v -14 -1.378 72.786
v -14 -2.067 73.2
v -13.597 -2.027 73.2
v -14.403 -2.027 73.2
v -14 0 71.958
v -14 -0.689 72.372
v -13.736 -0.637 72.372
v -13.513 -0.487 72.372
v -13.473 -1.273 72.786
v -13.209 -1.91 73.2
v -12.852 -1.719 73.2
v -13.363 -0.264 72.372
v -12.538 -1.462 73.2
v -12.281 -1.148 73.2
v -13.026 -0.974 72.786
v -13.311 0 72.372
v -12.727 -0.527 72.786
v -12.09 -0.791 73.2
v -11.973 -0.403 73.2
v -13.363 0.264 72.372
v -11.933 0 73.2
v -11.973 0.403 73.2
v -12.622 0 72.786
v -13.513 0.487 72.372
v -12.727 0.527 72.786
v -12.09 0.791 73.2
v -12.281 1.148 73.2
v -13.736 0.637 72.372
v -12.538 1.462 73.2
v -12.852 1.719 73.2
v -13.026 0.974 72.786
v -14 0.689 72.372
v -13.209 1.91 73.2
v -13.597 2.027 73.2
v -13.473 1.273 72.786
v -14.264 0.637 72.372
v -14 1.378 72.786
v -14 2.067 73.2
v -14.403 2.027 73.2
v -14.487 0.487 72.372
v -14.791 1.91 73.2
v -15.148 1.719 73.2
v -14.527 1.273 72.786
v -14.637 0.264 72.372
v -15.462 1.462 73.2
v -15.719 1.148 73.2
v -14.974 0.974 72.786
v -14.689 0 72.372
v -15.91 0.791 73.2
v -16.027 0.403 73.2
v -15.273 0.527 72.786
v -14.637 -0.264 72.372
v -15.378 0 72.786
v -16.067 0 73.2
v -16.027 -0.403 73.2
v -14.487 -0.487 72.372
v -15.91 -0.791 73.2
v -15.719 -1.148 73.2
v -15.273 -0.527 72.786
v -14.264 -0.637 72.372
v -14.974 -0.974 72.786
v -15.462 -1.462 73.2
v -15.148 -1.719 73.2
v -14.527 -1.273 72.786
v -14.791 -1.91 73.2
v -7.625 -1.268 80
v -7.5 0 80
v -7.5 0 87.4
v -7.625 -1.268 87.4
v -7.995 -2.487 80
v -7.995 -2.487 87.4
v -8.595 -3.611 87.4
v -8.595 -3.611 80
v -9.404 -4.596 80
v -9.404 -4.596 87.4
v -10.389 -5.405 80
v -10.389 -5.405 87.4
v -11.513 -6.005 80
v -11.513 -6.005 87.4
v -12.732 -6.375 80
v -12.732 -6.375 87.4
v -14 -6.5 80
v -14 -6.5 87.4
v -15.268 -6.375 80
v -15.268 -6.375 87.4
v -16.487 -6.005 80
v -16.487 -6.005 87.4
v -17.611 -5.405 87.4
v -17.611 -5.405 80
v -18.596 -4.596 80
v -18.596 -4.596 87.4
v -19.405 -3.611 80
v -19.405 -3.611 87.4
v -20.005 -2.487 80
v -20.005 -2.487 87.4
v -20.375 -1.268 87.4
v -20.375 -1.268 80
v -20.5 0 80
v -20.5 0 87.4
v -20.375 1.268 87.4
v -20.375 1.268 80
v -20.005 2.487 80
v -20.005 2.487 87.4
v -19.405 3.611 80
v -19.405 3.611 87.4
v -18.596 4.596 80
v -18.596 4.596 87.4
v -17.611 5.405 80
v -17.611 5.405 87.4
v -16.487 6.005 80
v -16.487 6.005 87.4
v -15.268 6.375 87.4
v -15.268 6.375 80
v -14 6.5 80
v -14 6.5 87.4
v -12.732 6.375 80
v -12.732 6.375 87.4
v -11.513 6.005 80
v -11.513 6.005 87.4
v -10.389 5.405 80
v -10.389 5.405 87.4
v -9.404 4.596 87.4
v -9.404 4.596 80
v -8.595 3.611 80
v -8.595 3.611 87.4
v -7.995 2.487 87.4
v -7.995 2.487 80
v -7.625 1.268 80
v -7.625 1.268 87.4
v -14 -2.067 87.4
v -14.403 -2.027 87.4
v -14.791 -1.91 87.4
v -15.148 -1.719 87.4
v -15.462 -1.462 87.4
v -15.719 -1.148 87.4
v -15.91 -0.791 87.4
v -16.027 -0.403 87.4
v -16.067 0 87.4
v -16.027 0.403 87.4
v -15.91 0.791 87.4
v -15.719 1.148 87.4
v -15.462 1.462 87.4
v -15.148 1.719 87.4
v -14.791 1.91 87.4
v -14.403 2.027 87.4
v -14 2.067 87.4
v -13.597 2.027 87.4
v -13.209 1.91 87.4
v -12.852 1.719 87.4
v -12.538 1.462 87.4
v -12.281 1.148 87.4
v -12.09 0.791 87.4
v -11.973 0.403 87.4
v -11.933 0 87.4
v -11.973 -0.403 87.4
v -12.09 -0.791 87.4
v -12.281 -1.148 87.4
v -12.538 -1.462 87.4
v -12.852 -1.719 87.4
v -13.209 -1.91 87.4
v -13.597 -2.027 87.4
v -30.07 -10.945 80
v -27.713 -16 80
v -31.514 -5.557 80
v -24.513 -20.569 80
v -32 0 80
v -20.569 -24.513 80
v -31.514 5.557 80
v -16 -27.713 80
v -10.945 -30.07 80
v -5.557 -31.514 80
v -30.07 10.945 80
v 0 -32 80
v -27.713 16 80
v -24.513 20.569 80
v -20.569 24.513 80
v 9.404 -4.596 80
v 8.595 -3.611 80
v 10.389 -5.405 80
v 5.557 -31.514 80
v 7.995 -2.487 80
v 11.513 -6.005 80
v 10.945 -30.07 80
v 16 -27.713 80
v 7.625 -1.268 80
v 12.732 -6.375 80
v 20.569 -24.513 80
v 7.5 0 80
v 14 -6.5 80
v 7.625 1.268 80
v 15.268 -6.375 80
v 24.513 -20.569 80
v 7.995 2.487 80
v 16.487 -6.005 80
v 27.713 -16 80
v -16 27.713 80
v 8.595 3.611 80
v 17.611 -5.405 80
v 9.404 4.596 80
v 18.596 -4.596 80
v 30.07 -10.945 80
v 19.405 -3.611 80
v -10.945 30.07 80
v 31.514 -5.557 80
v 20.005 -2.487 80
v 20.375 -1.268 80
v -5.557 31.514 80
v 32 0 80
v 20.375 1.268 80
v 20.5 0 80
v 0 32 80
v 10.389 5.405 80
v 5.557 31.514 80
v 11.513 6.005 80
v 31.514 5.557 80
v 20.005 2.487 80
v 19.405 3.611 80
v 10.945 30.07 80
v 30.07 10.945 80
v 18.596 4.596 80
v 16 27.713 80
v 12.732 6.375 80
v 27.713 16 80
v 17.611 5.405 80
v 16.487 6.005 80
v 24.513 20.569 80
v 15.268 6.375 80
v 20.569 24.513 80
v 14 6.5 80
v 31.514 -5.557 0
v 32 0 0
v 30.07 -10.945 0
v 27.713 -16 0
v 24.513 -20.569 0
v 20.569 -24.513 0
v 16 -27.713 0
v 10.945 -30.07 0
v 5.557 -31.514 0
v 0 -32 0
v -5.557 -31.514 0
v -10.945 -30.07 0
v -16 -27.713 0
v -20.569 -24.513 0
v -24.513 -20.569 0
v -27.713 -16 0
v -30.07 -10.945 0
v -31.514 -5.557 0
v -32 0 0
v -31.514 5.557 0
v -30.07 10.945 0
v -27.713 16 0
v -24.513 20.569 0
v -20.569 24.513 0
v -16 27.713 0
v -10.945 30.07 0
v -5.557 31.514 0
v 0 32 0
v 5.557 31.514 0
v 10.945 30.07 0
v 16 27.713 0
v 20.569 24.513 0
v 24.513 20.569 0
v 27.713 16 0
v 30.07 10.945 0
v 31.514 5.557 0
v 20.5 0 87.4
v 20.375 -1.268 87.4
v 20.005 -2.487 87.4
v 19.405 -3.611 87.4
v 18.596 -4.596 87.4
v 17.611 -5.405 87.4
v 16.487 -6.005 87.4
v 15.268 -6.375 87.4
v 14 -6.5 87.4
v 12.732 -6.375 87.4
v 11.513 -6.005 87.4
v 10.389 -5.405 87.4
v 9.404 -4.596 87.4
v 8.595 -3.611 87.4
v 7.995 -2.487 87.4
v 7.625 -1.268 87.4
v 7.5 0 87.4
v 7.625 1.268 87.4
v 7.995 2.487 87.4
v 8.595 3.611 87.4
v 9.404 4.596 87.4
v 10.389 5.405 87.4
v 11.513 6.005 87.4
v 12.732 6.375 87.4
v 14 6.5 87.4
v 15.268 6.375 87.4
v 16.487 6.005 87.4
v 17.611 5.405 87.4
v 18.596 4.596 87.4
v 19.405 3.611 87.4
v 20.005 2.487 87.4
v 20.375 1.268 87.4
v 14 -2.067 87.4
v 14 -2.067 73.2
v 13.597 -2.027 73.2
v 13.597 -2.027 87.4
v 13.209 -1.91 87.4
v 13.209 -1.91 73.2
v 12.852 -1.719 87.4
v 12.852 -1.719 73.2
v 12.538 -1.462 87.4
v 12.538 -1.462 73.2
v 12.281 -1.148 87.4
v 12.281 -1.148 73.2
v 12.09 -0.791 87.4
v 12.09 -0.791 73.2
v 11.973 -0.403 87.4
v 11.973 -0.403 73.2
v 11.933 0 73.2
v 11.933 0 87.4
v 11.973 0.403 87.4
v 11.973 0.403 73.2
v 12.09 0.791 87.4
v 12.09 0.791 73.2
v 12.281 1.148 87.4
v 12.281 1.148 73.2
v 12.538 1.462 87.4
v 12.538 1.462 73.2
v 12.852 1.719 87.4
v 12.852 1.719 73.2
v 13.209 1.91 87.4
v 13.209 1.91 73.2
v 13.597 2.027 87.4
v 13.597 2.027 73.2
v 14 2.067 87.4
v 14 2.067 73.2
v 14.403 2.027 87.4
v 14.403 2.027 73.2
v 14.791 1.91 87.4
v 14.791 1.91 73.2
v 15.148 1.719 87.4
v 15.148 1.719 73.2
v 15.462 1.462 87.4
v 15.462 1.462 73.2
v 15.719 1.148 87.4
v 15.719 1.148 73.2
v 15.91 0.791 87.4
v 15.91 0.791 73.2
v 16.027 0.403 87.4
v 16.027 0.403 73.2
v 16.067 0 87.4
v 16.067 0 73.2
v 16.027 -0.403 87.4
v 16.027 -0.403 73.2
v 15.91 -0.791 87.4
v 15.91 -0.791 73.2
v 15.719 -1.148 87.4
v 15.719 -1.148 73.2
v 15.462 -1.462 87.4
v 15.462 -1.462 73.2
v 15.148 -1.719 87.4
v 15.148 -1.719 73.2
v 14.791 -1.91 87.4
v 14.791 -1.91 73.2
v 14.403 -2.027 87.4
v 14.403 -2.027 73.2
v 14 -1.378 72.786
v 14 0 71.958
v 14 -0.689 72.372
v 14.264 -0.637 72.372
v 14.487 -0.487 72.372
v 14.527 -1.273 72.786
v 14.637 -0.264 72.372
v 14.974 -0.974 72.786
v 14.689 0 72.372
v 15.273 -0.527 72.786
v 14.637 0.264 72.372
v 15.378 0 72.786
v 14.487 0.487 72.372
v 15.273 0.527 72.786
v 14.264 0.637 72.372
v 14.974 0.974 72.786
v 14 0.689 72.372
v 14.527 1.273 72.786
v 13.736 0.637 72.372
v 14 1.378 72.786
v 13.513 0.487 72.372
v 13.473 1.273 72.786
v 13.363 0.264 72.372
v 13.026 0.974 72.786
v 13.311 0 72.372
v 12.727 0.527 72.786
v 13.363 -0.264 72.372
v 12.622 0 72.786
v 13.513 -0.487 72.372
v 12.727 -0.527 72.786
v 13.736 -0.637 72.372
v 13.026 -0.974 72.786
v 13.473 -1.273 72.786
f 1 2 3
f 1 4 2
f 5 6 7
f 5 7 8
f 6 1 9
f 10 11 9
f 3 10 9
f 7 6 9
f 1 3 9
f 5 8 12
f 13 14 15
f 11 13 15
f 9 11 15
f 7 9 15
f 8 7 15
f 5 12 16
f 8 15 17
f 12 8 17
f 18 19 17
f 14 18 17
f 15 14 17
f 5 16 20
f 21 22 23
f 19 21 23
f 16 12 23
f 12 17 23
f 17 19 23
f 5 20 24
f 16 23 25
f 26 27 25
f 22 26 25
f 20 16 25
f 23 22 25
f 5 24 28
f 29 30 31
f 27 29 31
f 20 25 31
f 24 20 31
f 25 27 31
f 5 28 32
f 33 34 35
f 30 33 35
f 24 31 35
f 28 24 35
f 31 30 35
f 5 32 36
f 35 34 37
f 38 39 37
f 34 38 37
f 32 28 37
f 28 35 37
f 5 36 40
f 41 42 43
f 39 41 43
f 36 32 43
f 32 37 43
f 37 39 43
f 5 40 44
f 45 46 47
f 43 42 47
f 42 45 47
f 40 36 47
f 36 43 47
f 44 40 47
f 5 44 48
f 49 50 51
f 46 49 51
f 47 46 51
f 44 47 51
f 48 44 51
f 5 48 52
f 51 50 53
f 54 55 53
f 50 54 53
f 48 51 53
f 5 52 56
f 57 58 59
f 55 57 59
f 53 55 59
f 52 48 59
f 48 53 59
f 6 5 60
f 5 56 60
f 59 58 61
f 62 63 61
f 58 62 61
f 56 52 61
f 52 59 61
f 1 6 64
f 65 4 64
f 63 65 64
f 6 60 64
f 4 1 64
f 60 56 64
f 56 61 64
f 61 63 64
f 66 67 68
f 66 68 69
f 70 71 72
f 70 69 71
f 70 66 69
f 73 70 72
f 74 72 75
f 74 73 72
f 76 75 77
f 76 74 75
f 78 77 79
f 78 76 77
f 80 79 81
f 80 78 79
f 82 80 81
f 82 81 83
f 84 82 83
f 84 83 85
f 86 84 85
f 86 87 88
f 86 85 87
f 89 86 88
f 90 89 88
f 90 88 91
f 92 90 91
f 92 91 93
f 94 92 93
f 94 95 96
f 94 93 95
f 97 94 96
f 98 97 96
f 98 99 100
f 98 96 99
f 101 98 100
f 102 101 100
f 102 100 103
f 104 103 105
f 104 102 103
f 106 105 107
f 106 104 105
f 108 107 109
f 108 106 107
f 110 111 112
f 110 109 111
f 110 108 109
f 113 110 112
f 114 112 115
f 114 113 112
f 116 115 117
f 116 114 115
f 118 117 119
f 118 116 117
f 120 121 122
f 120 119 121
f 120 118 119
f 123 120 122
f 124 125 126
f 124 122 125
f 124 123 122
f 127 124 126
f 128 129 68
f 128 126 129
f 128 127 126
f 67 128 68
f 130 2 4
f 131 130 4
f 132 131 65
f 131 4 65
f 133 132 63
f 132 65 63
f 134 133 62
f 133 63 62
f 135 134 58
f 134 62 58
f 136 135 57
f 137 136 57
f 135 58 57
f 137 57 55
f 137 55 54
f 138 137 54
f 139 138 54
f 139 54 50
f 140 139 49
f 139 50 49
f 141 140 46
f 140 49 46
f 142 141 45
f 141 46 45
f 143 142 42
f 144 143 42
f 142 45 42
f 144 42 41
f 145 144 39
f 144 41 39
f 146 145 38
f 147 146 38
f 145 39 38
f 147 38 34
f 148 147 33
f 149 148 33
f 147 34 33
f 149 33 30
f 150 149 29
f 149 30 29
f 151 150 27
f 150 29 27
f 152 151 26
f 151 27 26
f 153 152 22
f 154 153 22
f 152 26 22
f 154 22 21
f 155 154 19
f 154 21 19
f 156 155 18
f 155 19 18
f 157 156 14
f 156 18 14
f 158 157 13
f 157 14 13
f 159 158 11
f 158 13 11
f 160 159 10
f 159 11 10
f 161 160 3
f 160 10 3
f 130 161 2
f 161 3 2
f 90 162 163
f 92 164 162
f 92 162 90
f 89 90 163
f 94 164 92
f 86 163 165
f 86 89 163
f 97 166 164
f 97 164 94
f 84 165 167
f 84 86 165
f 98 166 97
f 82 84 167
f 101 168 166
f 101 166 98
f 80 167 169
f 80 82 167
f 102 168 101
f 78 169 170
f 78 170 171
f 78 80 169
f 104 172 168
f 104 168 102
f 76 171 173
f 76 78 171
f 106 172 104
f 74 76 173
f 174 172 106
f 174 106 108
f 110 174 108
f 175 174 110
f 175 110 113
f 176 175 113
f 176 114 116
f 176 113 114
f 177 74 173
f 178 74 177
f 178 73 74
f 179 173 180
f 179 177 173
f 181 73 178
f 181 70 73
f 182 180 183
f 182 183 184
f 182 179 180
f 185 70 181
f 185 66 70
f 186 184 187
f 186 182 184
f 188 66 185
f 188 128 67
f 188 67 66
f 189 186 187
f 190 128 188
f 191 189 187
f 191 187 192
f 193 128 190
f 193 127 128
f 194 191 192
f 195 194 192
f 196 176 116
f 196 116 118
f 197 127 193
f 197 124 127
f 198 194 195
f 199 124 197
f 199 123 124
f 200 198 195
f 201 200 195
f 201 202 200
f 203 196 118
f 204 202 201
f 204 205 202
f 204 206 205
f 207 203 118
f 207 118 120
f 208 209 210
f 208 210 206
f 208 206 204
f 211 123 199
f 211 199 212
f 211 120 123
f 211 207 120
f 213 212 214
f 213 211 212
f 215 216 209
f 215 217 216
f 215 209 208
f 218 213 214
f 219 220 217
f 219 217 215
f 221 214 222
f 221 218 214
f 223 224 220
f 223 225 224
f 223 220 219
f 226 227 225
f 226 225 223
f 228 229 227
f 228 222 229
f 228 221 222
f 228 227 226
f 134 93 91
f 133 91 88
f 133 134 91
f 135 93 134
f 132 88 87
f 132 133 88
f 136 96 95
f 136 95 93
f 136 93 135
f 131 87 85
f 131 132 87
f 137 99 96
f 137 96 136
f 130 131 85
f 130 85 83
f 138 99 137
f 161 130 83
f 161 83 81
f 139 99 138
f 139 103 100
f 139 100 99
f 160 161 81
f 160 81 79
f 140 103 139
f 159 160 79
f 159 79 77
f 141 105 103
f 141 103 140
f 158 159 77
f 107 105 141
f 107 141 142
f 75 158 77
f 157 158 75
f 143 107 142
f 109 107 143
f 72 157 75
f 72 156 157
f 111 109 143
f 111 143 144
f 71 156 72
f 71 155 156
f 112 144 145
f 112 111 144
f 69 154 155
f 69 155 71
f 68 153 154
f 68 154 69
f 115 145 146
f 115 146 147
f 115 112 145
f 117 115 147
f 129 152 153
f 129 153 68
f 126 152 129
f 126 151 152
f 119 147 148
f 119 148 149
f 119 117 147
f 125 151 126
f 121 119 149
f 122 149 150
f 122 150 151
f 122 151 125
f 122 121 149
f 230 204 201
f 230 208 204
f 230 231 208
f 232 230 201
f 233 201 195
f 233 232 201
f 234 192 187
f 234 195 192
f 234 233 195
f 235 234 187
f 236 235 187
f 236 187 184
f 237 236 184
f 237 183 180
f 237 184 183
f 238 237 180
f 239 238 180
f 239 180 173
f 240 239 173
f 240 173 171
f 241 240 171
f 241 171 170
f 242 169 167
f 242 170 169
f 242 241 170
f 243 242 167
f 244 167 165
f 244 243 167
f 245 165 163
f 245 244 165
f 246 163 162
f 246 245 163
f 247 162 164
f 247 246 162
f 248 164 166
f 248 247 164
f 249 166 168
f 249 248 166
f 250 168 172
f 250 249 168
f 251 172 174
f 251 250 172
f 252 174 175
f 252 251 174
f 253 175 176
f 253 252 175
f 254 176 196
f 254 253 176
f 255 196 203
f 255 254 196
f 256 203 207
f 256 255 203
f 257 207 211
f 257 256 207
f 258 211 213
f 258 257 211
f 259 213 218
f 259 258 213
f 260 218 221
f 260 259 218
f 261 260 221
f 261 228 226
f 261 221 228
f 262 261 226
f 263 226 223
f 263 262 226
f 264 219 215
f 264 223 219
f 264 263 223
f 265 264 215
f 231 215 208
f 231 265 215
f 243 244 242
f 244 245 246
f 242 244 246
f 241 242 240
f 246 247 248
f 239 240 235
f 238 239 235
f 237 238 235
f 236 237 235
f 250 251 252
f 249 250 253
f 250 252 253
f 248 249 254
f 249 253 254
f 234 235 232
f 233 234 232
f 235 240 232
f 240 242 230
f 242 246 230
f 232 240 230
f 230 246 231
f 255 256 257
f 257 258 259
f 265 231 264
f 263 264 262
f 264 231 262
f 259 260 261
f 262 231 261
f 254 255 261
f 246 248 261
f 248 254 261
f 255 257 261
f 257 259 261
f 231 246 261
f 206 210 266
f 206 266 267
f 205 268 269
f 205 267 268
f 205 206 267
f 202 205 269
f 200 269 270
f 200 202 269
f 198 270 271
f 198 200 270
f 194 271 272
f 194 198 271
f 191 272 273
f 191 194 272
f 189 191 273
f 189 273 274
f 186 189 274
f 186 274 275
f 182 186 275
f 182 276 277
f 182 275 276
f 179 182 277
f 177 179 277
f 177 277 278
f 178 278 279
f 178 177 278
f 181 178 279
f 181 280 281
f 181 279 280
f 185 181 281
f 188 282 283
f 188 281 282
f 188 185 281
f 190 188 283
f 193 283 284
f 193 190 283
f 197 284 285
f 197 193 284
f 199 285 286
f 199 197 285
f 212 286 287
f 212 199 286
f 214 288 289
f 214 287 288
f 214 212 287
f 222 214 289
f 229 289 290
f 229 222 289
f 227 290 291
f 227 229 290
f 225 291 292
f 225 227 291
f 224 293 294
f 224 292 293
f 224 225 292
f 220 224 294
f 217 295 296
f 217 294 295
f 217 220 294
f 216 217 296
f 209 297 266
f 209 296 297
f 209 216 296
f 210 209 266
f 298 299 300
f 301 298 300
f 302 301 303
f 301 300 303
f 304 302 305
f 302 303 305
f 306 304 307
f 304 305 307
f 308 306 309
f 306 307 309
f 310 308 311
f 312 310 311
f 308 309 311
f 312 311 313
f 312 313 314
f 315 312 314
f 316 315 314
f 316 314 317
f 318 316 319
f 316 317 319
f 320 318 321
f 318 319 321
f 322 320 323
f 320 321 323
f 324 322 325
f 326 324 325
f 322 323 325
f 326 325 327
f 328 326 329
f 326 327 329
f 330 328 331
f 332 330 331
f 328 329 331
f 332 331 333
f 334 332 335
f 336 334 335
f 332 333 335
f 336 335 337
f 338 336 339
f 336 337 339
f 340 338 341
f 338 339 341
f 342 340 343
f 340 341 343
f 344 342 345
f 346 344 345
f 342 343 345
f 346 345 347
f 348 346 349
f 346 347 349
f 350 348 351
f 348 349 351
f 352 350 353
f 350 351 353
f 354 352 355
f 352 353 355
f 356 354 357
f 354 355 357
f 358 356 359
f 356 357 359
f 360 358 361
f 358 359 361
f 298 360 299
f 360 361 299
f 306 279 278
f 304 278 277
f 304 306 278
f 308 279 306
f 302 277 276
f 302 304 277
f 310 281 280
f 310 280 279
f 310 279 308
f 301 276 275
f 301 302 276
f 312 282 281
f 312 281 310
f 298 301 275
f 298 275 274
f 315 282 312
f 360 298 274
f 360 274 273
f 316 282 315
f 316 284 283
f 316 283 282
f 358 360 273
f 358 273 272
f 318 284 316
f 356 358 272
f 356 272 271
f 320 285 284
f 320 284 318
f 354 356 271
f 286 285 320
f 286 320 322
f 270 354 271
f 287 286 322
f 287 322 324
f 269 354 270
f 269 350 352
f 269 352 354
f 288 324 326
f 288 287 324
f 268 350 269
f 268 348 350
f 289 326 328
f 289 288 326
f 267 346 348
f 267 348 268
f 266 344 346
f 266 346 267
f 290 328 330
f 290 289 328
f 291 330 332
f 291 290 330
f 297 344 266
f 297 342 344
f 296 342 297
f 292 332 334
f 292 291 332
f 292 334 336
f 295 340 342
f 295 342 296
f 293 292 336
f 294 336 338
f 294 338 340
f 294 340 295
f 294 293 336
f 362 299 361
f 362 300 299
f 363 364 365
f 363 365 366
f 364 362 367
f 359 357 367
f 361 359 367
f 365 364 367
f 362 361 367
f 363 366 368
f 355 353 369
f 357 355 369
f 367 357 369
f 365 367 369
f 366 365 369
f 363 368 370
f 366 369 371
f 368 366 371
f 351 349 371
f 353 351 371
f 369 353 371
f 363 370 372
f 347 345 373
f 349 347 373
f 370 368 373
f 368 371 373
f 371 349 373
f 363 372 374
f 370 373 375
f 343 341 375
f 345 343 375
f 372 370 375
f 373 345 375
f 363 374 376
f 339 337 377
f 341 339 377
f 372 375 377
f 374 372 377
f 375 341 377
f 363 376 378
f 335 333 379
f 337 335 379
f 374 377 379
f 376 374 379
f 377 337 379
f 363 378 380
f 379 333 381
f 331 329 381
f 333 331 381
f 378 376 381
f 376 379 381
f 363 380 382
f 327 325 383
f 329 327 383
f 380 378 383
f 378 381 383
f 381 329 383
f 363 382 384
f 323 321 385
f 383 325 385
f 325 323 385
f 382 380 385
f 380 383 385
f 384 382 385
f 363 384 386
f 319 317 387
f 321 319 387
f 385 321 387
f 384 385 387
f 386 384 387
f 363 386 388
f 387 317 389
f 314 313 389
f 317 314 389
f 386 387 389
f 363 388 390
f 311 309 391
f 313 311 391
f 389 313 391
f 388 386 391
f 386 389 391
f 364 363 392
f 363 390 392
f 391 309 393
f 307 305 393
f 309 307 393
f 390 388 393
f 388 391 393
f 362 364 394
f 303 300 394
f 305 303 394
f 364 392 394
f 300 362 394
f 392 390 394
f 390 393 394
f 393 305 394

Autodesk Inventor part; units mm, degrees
ref_plane "YZ Plane" through (0, 0, 0) normal (1, 0, 0) x (0, 1, 0)
ref_plane "XZ Plane" through (0, 0, 0) normal (0, 1, 0) x (-1, 0, 0)
ref_plane "XY Plane" through (0, 0, 0) normal (0, 0, 1) x (1, 0, 0)
sketch "Sketch1" plane through (0, 0, 0) normal (0, 0, 1) x (1, 0, 0)
  circle A0 centre (0, 0) radius 32
  dimension "d0" = 64
extrude "Extrusion1" add sketch "Sketch1" along normal blind 80
sketch "Sketch2" plane through (0, 0, 80) normal (0, 0, 1) x (1, 0, 0)
  line L0 (-14, 0) -> (14, 0) construction
  circle A0 centre (14, 0) radius 6.5
  circle A1 centre (-14, 0) radius 6.5
  point P0 (0, 0)
  point P1 (0, 0)
  dimension "d3" = 28
  dimension "d4" = 13
  dimension "d5" = 13
extrude "Extrusion2" add sketch "Sketch2" along normal blind 7.4
sketch "Sketch3" plane through (-14, 0, 87.4) normal (0, 0, 1) x (1, 0, 0)
  point P0 (14, 0)
  point P1 (0, 0)
  point P2 (28, 0)
  dimension "d8" = 28
  dimension "d9" = 14
hole "Hole1" at (-14, 0, 87.4) at (14, 0, 87.4) direction (0, 0, -1) diameter 4.134 depth 14.2 tip angle 118 thread size "M5x0.8" class "6H" standard "ISO Metric profile"
properties part number "Capw"
